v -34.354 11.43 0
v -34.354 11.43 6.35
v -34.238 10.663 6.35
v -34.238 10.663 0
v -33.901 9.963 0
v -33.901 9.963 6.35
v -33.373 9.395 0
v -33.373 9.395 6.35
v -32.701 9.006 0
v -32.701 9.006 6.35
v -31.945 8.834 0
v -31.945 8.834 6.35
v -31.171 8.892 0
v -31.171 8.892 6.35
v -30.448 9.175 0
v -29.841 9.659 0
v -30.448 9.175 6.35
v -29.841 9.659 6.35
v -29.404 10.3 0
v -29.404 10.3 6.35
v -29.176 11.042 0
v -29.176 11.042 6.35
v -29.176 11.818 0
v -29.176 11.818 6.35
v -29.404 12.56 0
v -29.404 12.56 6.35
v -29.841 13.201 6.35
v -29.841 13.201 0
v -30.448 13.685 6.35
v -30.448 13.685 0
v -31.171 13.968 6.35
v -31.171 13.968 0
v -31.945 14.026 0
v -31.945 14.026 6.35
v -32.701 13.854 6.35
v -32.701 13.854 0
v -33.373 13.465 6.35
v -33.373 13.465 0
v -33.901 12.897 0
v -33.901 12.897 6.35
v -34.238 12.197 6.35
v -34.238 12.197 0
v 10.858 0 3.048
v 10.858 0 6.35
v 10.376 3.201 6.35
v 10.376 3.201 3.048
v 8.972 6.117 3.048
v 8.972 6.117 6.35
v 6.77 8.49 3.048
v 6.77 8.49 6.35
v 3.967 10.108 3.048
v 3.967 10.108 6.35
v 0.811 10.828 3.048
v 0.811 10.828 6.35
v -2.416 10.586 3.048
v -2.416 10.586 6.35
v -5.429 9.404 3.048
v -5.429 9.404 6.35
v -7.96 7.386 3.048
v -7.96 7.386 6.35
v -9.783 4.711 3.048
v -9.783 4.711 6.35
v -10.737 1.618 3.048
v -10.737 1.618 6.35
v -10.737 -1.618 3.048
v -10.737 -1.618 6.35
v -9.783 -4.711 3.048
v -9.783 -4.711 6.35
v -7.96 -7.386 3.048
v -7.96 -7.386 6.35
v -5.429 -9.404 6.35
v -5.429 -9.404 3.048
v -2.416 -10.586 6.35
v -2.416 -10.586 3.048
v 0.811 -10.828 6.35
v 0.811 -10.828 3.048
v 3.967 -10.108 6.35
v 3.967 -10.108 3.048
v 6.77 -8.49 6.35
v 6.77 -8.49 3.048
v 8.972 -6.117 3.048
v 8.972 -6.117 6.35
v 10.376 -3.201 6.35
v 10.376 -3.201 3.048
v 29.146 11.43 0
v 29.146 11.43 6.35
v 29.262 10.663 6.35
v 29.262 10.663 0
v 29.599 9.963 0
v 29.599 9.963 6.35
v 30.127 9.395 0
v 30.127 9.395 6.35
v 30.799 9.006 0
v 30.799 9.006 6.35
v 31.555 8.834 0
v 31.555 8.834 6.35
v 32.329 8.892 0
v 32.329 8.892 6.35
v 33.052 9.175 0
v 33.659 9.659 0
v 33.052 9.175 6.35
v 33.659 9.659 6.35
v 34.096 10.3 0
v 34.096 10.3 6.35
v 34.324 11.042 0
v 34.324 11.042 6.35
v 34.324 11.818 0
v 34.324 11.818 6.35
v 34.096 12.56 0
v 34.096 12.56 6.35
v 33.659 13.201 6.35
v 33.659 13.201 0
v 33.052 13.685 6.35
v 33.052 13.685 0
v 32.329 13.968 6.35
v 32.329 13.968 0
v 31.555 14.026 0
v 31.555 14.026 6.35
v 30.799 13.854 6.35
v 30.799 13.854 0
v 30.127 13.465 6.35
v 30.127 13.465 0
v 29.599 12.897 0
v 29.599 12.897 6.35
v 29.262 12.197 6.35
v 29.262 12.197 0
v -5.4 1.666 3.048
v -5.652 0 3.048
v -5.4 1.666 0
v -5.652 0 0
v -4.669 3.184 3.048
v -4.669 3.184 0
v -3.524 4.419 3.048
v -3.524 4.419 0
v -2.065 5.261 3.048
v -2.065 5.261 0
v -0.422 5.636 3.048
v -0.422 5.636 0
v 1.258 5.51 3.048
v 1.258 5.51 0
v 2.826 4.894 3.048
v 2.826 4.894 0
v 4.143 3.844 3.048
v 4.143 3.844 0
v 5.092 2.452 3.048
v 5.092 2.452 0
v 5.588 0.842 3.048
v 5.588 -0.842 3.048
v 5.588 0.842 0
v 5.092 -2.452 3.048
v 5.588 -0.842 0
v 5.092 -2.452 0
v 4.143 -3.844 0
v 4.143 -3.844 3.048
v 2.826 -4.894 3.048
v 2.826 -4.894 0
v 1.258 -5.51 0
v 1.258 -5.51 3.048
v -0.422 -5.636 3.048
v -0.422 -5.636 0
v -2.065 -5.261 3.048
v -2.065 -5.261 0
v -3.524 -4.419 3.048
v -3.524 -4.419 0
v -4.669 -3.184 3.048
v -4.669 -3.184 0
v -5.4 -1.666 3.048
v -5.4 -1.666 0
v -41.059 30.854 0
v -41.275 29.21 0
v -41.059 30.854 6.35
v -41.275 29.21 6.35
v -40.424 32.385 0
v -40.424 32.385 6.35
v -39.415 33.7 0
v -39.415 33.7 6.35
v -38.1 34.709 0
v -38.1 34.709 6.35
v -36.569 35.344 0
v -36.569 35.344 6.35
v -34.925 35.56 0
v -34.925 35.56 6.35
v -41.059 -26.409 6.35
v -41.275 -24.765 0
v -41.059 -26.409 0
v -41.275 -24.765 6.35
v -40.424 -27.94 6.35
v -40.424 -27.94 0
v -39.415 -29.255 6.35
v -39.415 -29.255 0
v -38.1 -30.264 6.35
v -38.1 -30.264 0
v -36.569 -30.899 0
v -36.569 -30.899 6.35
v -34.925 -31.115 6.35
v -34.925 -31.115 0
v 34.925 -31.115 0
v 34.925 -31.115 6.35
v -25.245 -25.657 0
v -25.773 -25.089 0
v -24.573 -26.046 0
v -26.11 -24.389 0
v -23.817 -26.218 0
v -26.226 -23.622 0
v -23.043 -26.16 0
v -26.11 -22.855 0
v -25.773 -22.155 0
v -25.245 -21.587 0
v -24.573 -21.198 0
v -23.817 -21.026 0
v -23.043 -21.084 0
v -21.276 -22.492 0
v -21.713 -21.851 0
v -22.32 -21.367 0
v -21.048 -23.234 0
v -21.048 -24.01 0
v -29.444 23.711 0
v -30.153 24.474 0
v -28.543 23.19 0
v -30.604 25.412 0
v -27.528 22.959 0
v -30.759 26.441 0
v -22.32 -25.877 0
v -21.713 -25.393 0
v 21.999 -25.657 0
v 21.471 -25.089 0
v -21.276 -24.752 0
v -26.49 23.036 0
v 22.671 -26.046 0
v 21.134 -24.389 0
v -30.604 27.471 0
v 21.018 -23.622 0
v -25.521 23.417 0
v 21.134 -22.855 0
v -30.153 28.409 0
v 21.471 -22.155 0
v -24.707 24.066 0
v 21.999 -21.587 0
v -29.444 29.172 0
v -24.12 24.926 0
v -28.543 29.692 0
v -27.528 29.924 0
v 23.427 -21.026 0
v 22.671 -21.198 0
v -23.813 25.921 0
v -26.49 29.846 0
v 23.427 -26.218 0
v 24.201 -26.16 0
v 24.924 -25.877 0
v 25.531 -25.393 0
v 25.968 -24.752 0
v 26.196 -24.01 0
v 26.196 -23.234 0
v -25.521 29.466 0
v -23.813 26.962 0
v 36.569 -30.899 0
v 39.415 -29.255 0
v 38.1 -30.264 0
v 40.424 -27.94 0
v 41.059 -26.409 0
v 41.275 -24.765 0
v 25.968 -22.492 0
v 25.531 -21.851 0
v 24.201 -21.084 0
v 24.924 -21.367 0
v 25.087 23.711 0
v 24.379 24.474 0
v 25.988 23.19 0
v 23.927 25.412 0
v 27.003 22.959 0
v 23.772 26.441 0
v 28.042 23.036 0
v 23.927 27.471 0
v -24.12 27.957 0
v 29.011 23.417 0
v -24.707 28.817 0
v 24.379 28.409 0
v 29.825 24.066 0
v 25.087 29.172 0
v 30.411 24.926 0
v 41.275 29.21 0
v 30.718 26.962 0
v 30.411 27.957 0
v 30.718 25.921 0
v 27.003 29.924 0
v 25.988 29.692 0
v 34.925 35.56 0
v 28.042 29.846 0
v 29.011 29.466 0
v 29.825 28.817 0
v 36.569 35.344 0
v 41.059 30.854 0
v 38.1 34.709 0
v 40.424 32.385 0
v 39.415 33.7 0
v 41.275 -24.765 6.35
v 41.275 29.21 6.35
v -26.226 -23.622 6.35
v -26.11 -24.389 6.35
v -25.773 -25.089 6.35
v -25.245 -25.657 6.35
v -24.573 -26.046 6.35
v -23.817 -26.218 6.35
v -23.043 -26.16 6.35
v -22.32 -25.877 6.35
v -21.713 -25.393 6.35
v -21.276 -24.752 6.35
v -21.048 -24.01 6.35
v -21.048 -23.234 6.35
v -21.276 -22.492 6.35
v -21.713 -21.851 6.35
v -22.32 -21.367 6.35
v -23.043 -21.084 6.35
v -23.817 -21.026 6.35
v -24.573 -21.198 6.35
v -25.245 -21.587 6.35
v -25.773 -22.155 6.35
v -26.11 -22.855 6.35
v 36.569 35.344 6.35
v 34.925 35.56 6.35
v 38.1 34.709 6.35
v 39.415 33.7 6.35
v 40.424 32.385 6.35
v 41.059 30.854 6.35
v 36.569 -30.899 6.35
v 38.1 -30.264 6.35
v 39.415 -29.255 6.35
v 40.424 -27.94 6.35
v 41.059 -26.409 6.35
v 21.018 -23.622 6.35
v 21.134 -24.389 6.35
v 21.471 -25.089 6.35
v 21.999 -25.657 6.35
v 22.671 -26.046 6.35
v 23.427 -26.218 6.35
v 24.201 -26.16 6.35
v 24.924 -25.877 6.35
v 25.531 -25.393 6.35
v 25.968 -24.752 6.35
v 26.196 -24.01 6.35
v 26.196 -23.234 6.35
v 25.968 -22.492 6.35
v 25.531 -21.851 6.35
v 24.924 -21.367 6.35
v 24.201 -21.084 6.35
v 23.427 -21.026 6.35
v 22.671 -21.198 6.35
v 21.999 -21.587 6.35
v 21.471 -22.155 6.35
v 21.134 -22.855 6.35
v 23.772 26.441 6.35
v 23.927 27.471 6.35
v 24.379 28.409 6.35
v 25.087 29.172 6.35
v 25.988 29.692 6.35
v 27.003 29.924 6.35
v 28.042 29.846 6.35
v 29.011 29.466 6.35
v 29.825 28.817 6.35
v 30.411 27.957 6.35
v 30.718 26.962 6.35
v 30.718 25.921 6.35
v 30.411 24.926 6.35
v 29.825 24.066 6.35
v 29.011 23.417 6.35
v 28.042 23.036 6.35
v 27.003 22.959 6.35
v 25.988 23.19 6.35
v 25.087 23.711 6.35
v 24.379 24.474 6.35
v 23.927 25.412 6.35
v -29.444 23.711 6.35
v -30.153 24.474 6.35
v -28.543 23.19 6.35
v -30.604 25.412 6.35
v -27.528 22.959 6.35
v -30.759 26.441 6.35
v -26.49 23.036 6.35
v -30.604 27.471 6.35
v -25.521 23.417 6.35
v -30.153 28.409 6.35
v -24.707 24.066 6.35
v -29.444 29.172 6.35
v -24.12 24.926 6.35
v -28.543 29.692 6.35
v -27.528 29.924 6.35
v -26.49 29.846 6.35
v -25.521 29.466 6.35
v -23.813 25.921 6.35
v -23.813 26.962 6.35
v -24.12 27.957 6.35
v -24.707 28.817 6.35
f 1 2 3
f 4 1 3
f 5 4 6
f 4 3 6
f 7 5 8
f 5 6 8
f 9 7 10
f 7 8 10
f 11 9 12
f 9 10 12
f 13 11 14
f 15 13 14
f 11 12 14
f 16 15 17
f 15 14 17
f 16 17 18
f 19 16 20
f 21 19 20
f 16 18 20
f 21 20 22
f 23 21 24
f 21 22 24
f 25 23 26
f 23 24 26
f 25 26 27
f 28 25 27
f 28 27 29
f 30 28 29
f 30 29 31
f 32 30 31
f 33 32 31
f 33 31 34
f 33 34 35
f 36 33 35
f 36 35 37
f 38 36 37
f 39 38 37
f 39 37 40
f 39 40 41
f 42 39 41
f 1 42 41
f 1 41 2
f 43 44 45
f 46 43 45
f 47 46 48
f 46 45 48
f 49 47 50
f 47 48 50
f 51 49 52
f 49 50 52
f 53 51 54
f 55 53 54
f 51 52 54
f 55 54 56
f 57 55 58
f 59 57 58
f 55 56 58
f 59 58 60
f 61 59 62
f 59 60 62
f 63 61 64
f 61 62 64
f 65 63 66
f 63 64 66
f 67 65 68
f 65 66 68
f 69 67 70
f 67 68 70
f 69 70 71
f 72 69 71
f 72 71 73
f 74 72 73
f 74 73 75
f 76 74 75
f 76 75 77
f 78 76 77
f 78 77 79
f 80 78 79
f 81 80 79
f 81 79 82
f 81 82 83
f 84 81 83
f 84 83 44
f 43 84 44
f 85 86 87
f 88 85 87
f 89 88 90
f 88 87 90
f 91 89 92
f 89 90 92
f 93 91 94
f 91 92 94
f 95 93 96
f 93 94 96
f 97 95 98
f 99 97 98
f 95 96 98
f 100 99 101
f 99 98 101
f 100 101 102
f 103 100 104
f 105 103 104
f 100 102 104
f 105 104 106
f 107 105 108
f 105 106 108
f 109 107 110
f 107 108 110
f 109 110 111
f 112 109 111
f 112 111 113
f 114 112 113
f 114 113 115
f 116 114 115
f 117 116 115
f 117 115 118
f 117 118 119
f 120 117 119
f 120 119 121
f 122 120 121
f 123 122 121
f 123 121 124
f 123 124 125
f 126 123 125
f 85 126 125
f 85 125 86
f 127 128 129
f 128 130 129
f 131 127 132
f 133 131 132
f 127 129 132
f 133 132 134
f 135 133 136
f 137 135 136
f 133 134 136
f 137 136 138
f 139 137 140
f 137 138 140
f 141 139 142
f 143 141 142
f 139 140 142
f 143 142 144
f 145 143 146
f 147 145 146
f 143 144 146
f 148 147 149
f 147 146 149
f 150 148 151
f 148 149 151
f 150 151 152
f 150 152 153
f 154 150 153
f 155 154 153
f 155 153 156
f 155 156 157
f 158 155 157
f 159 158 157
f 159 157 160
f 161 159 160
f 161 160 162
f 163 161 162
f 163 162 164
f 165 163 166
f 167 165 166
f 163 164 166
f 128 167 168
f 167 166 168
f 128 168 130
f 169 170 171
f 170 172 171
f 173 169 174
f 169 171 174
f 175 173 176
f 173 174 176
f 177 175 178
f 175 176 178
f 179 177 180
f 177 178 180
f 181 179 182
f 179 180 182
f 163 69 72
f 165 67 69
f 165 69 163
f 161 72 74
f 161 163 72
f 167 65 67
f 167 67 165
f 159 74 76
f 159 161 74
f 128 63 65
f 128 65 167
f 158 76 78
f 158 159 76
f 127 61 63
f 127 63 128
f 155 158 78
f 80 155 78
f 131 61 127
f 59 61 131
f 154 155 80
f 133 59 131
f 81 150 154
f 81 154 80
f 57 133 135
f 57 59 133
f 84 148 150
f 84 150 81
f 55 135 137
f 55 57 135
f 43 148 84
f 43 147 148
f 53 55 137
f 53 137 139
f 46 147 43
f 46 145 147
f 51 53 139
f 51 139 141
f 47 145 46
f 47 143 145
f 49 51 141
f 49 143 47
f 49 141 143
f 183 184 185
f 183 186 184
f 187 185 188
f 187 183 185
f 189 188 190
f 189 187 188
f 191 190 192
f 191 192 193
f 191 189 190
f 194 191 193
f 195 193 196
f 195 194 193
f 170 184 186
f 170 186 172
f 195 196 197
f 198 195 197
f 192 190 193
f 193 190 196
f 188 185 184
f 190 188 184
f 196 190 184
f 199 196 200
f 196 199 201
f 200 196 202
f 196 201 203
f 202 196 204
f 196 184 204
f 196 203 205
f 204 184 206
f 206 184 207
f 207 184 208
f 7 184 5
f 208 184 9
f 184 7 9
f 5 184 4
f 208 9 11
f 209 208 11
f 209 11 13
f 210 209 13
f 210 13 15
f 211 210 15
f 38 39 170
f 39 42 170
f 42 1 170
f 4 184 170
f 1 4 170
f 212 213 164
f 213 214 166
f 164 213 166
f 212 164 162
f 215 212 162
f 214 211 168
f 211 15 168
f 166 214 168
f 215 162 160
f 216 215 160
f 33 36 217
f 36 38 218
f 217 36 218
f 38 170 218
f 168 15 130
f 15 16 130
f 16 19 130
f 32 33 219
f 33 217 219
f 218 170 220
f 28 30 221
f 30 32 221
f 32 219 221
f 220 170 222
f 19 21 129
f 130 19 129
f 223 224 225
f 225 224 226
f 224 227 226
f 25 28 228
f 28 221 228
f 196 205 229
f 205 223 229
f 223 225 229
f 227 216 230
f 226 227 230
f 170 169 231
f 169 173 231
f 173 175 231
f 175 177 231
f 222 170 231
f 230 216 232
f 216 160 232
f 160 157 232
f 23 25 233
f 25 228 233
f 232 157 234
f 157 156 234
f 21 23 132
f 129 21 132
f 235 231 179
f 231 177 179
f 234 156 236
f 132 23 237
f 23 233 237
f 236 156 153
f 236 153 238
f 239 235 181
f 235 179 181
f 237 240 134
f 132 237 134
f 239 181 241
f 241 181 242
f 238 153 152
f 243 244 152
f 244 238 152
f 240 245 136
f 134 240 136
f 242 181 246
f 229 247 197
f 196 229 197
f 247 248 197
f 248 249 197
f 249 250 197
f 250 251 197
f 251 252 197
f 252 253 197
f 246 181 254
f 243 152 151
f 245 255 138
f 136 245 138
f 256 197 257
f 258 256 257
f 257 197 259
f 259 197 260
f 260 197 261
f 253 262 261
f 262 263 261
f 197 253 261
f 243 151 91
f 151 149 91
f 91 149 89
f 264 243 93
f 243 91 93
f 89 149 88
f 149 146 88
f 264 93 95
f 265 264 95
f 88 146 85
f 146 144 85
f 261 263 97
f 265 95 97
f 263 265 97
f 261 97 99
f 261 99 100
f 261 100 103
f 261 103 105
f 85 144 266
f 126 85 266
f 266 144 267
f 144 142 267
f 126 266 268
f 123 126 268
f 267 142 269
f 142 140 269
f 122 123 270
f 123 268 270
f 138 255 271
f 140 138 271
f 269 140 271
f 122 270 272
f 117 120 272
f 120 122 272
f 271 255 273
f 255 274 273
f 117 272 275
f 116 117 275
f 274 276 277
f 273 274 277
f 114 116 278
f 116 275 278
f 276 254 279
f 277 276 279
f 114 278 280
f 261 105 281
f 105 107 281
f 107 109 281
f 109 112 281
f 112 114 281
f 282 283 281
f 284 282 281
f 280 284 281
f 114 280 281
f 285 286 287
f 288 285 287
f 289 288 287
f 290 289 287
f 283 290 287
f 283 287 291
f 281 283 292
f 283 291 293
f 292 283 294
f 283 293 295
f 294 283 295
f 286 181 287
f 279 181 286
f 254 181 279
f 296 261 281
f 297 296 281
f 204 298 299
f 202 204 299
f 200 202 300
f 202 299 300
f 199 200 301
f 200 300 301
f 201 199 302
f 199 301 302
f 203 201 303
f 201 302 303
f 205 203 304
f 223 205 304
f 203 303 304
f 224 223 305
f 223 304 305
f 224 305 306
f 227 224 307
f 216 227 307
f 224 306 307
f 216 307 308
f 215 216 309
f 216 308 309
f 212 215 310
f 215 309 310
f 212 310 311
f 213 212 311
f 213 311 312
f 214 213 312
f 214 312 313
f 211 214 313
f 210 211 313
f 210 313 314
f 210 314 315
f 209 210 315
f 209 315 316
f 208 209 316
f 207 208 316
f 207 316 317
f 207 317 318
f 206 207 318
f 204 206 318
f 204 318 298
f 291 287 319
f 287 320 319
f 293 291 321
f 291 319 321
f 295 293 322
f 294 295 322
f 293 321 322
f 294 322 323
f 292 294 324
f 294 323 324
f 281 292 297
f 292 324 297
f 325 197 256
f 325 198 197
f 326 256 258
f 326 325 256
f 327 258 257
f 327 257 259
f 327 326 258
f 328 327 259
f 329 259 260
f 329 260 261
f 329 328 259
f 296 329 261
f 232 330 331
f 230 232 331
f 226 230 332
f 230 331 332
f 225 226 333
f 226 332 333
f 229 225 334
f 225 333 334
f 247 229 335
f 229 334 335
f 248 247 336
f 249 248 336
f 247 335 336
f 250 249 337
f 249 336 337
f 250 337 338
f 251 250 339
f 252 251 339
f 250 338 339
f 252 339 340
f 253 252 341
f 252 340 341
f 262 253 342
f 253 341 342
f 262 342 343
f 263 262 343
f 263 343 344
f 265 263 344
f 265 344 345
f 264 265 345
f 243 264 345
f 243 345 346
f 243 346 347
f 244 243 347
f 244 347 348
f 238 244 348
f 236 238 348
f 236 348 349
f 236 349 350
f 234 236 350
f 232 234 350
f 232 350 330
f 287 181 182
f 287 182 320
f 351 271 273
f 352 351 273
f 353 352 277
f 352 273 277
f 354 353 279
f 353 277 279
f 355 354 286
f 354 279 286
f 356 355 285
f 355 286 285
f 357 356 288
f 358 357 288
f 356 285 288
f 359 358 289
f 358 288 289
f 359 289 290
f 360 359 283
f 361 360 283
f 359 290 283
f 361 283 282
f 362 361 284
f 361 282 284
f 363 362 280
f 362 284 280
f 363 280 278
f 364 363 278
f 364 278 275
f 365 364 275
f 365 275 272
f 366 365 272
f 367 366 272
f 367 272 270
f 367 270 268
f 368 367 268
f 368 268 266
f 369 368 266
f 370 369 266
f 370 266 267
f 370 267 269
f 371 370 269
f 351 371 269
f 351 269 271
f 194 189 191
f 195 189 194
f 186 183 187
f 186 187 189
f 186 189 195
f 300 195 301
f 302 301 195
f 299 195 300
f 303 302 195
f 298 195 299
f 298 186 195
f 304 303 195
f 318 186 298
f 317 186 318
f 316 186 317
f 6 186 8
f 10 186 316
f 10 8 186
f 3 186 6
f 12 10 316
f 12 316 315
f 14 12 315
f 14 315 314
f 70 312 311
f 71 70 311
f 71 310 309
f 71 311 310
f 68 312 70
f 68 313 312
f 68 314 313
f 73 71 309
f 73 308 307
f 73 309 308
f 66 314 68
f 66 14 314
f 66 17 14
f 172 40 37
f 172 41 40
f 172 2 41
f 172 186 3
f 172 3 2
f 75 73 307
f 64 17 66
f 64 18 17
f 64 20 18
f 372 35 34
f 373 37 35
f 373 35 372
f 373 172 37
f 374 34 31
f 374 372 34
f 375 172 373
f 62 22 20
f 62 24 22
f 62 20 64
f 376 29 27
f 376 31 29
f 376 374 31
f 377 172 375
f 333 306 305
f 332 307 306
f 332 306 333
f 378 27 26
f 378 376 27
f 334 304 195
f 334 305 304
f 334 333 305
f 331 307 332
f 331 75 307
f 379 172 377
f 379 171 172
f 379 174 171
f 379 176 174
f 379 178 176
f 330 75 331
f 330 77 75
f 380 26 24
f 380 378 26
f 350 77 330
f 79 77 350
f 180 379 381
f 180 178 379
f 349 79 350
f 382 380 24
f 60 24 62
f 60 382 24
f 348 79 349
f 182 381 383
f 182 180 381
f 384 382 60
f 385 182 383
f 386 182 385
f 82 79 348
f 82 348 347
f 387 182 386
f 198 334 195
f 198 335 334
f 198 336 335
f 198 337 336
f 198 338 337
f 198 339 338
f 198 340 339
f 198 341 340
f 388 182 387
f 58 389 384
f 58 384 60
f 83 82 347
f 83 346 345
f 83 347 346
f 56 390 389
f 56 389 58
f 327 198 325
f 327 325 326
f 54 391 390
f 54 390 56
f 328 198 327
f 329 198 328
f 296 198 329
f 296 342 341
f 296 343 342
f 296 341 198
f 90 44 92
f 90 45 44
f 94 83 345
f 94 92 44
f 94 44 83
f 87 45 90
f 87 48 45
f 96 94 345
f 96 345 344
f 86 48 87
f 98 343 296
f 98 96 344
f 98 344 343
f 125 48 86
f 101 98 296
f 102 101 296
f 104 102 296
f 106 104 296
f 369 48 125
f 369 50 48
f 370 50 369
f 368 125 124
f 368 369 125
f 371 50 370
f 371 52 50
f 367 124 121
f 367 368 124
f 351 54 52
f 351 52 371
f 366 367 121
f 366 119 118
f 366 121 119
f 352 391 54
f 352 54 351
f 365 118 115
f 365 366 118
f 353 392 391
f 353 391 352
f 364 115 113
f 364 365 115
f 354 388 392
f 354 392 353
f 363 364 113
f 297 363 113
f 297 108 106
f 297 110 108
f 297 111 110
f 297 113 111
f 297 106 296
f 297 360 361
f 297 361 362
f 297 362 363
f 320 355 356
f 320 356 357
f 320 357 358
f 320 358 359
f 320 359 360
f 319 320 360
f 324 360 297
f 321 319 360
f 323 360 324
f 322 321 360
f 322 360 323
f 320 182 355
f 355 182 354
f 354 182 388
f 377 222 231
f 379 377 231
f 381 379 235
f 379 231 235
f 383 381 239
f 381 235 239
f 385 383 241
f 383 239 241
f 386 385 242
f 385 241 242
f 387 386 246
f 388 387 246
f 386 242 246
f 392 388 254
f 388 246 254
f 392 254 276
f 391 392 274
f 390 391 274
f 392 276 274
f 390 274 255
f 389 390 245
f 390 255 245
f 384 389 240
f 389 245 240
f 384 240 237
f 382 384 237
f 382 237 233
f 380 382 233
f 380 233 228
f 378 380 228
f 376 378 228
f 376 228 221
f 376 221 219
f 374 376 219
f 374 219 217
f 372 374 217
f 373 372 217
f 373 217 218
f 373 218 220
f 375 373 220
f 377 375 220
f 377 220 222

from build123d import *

# Parameters (mm, degrees)
F1_W           = 82.55
F1_H           = 66.675
F2_DEPTH       = 6.35
F4_D           = 11.303
F4_CBORE_D     = 21.717
F4_CBORE_DEPTH = 3.302
F6_D           = 6.985
F7_D           = 6.985
F8_D           = 5.207
F9_R           = 6.35
F11_D          = 5.207


with BuildPart() as f2:
    # F1 (on Top) → F2 (new body)
    with BuildSketch(Plane.XY):
        with Locations((0, 2.2225)):
            Rectangle(F1_W, F1_H)
    extrude(amount=F2_DEPTH)

    # F4 (through all)
    with Locations(Plane.XY.offset(6.35)):
        with Locations((0, 0)):
            CounterBoreHole(F4_D / 2, F4_CBORE_D / 2, F4_CBORE_DEPTH)

    # F6 (through all)
    with Locations(Plane.XY.offset(6.35)):
        with Locations((-27.2669, 26.4414)):
            Hole(F6_D / 2)

    # F7 (through all)
    with Locations(Plane.XY.offset(6.35)):
        with Locations((27.26436, 26.4414)):
            Hole(F7_D / 2)

    # F8 (through all)
    with Locations(Plane(origin=(0, 0, 0), x_dir=(1, 0, 0), z_dir=(0, 0, -1))):
        with Locations((23.622, 23.622), (-23.622, 23.622)):
            Hole(F8_D / 2)

    # F9
    f9_edges = [f2.edges().sort_by_distance(p)[0] for p in [
        (-41.275, -31.115, 3.175),
        (41.275, -31.115, 3.175),
        (41.275, 35.56, 3.175),
        (-41.275, 35.56, 3.175),
    ]]
    fillet(f9_edges, radius=F9_R)

    # F11 (through all)
    with Locations(Plane(origin=(0, 0, 0), x_dir=(1, 0, 0), z_dir=(0, 0, -1))):
        with Locations((-31.75, -11.43), (31.75, -11.43)):
            Hole(F11_D / 2)


solid = f2.part
